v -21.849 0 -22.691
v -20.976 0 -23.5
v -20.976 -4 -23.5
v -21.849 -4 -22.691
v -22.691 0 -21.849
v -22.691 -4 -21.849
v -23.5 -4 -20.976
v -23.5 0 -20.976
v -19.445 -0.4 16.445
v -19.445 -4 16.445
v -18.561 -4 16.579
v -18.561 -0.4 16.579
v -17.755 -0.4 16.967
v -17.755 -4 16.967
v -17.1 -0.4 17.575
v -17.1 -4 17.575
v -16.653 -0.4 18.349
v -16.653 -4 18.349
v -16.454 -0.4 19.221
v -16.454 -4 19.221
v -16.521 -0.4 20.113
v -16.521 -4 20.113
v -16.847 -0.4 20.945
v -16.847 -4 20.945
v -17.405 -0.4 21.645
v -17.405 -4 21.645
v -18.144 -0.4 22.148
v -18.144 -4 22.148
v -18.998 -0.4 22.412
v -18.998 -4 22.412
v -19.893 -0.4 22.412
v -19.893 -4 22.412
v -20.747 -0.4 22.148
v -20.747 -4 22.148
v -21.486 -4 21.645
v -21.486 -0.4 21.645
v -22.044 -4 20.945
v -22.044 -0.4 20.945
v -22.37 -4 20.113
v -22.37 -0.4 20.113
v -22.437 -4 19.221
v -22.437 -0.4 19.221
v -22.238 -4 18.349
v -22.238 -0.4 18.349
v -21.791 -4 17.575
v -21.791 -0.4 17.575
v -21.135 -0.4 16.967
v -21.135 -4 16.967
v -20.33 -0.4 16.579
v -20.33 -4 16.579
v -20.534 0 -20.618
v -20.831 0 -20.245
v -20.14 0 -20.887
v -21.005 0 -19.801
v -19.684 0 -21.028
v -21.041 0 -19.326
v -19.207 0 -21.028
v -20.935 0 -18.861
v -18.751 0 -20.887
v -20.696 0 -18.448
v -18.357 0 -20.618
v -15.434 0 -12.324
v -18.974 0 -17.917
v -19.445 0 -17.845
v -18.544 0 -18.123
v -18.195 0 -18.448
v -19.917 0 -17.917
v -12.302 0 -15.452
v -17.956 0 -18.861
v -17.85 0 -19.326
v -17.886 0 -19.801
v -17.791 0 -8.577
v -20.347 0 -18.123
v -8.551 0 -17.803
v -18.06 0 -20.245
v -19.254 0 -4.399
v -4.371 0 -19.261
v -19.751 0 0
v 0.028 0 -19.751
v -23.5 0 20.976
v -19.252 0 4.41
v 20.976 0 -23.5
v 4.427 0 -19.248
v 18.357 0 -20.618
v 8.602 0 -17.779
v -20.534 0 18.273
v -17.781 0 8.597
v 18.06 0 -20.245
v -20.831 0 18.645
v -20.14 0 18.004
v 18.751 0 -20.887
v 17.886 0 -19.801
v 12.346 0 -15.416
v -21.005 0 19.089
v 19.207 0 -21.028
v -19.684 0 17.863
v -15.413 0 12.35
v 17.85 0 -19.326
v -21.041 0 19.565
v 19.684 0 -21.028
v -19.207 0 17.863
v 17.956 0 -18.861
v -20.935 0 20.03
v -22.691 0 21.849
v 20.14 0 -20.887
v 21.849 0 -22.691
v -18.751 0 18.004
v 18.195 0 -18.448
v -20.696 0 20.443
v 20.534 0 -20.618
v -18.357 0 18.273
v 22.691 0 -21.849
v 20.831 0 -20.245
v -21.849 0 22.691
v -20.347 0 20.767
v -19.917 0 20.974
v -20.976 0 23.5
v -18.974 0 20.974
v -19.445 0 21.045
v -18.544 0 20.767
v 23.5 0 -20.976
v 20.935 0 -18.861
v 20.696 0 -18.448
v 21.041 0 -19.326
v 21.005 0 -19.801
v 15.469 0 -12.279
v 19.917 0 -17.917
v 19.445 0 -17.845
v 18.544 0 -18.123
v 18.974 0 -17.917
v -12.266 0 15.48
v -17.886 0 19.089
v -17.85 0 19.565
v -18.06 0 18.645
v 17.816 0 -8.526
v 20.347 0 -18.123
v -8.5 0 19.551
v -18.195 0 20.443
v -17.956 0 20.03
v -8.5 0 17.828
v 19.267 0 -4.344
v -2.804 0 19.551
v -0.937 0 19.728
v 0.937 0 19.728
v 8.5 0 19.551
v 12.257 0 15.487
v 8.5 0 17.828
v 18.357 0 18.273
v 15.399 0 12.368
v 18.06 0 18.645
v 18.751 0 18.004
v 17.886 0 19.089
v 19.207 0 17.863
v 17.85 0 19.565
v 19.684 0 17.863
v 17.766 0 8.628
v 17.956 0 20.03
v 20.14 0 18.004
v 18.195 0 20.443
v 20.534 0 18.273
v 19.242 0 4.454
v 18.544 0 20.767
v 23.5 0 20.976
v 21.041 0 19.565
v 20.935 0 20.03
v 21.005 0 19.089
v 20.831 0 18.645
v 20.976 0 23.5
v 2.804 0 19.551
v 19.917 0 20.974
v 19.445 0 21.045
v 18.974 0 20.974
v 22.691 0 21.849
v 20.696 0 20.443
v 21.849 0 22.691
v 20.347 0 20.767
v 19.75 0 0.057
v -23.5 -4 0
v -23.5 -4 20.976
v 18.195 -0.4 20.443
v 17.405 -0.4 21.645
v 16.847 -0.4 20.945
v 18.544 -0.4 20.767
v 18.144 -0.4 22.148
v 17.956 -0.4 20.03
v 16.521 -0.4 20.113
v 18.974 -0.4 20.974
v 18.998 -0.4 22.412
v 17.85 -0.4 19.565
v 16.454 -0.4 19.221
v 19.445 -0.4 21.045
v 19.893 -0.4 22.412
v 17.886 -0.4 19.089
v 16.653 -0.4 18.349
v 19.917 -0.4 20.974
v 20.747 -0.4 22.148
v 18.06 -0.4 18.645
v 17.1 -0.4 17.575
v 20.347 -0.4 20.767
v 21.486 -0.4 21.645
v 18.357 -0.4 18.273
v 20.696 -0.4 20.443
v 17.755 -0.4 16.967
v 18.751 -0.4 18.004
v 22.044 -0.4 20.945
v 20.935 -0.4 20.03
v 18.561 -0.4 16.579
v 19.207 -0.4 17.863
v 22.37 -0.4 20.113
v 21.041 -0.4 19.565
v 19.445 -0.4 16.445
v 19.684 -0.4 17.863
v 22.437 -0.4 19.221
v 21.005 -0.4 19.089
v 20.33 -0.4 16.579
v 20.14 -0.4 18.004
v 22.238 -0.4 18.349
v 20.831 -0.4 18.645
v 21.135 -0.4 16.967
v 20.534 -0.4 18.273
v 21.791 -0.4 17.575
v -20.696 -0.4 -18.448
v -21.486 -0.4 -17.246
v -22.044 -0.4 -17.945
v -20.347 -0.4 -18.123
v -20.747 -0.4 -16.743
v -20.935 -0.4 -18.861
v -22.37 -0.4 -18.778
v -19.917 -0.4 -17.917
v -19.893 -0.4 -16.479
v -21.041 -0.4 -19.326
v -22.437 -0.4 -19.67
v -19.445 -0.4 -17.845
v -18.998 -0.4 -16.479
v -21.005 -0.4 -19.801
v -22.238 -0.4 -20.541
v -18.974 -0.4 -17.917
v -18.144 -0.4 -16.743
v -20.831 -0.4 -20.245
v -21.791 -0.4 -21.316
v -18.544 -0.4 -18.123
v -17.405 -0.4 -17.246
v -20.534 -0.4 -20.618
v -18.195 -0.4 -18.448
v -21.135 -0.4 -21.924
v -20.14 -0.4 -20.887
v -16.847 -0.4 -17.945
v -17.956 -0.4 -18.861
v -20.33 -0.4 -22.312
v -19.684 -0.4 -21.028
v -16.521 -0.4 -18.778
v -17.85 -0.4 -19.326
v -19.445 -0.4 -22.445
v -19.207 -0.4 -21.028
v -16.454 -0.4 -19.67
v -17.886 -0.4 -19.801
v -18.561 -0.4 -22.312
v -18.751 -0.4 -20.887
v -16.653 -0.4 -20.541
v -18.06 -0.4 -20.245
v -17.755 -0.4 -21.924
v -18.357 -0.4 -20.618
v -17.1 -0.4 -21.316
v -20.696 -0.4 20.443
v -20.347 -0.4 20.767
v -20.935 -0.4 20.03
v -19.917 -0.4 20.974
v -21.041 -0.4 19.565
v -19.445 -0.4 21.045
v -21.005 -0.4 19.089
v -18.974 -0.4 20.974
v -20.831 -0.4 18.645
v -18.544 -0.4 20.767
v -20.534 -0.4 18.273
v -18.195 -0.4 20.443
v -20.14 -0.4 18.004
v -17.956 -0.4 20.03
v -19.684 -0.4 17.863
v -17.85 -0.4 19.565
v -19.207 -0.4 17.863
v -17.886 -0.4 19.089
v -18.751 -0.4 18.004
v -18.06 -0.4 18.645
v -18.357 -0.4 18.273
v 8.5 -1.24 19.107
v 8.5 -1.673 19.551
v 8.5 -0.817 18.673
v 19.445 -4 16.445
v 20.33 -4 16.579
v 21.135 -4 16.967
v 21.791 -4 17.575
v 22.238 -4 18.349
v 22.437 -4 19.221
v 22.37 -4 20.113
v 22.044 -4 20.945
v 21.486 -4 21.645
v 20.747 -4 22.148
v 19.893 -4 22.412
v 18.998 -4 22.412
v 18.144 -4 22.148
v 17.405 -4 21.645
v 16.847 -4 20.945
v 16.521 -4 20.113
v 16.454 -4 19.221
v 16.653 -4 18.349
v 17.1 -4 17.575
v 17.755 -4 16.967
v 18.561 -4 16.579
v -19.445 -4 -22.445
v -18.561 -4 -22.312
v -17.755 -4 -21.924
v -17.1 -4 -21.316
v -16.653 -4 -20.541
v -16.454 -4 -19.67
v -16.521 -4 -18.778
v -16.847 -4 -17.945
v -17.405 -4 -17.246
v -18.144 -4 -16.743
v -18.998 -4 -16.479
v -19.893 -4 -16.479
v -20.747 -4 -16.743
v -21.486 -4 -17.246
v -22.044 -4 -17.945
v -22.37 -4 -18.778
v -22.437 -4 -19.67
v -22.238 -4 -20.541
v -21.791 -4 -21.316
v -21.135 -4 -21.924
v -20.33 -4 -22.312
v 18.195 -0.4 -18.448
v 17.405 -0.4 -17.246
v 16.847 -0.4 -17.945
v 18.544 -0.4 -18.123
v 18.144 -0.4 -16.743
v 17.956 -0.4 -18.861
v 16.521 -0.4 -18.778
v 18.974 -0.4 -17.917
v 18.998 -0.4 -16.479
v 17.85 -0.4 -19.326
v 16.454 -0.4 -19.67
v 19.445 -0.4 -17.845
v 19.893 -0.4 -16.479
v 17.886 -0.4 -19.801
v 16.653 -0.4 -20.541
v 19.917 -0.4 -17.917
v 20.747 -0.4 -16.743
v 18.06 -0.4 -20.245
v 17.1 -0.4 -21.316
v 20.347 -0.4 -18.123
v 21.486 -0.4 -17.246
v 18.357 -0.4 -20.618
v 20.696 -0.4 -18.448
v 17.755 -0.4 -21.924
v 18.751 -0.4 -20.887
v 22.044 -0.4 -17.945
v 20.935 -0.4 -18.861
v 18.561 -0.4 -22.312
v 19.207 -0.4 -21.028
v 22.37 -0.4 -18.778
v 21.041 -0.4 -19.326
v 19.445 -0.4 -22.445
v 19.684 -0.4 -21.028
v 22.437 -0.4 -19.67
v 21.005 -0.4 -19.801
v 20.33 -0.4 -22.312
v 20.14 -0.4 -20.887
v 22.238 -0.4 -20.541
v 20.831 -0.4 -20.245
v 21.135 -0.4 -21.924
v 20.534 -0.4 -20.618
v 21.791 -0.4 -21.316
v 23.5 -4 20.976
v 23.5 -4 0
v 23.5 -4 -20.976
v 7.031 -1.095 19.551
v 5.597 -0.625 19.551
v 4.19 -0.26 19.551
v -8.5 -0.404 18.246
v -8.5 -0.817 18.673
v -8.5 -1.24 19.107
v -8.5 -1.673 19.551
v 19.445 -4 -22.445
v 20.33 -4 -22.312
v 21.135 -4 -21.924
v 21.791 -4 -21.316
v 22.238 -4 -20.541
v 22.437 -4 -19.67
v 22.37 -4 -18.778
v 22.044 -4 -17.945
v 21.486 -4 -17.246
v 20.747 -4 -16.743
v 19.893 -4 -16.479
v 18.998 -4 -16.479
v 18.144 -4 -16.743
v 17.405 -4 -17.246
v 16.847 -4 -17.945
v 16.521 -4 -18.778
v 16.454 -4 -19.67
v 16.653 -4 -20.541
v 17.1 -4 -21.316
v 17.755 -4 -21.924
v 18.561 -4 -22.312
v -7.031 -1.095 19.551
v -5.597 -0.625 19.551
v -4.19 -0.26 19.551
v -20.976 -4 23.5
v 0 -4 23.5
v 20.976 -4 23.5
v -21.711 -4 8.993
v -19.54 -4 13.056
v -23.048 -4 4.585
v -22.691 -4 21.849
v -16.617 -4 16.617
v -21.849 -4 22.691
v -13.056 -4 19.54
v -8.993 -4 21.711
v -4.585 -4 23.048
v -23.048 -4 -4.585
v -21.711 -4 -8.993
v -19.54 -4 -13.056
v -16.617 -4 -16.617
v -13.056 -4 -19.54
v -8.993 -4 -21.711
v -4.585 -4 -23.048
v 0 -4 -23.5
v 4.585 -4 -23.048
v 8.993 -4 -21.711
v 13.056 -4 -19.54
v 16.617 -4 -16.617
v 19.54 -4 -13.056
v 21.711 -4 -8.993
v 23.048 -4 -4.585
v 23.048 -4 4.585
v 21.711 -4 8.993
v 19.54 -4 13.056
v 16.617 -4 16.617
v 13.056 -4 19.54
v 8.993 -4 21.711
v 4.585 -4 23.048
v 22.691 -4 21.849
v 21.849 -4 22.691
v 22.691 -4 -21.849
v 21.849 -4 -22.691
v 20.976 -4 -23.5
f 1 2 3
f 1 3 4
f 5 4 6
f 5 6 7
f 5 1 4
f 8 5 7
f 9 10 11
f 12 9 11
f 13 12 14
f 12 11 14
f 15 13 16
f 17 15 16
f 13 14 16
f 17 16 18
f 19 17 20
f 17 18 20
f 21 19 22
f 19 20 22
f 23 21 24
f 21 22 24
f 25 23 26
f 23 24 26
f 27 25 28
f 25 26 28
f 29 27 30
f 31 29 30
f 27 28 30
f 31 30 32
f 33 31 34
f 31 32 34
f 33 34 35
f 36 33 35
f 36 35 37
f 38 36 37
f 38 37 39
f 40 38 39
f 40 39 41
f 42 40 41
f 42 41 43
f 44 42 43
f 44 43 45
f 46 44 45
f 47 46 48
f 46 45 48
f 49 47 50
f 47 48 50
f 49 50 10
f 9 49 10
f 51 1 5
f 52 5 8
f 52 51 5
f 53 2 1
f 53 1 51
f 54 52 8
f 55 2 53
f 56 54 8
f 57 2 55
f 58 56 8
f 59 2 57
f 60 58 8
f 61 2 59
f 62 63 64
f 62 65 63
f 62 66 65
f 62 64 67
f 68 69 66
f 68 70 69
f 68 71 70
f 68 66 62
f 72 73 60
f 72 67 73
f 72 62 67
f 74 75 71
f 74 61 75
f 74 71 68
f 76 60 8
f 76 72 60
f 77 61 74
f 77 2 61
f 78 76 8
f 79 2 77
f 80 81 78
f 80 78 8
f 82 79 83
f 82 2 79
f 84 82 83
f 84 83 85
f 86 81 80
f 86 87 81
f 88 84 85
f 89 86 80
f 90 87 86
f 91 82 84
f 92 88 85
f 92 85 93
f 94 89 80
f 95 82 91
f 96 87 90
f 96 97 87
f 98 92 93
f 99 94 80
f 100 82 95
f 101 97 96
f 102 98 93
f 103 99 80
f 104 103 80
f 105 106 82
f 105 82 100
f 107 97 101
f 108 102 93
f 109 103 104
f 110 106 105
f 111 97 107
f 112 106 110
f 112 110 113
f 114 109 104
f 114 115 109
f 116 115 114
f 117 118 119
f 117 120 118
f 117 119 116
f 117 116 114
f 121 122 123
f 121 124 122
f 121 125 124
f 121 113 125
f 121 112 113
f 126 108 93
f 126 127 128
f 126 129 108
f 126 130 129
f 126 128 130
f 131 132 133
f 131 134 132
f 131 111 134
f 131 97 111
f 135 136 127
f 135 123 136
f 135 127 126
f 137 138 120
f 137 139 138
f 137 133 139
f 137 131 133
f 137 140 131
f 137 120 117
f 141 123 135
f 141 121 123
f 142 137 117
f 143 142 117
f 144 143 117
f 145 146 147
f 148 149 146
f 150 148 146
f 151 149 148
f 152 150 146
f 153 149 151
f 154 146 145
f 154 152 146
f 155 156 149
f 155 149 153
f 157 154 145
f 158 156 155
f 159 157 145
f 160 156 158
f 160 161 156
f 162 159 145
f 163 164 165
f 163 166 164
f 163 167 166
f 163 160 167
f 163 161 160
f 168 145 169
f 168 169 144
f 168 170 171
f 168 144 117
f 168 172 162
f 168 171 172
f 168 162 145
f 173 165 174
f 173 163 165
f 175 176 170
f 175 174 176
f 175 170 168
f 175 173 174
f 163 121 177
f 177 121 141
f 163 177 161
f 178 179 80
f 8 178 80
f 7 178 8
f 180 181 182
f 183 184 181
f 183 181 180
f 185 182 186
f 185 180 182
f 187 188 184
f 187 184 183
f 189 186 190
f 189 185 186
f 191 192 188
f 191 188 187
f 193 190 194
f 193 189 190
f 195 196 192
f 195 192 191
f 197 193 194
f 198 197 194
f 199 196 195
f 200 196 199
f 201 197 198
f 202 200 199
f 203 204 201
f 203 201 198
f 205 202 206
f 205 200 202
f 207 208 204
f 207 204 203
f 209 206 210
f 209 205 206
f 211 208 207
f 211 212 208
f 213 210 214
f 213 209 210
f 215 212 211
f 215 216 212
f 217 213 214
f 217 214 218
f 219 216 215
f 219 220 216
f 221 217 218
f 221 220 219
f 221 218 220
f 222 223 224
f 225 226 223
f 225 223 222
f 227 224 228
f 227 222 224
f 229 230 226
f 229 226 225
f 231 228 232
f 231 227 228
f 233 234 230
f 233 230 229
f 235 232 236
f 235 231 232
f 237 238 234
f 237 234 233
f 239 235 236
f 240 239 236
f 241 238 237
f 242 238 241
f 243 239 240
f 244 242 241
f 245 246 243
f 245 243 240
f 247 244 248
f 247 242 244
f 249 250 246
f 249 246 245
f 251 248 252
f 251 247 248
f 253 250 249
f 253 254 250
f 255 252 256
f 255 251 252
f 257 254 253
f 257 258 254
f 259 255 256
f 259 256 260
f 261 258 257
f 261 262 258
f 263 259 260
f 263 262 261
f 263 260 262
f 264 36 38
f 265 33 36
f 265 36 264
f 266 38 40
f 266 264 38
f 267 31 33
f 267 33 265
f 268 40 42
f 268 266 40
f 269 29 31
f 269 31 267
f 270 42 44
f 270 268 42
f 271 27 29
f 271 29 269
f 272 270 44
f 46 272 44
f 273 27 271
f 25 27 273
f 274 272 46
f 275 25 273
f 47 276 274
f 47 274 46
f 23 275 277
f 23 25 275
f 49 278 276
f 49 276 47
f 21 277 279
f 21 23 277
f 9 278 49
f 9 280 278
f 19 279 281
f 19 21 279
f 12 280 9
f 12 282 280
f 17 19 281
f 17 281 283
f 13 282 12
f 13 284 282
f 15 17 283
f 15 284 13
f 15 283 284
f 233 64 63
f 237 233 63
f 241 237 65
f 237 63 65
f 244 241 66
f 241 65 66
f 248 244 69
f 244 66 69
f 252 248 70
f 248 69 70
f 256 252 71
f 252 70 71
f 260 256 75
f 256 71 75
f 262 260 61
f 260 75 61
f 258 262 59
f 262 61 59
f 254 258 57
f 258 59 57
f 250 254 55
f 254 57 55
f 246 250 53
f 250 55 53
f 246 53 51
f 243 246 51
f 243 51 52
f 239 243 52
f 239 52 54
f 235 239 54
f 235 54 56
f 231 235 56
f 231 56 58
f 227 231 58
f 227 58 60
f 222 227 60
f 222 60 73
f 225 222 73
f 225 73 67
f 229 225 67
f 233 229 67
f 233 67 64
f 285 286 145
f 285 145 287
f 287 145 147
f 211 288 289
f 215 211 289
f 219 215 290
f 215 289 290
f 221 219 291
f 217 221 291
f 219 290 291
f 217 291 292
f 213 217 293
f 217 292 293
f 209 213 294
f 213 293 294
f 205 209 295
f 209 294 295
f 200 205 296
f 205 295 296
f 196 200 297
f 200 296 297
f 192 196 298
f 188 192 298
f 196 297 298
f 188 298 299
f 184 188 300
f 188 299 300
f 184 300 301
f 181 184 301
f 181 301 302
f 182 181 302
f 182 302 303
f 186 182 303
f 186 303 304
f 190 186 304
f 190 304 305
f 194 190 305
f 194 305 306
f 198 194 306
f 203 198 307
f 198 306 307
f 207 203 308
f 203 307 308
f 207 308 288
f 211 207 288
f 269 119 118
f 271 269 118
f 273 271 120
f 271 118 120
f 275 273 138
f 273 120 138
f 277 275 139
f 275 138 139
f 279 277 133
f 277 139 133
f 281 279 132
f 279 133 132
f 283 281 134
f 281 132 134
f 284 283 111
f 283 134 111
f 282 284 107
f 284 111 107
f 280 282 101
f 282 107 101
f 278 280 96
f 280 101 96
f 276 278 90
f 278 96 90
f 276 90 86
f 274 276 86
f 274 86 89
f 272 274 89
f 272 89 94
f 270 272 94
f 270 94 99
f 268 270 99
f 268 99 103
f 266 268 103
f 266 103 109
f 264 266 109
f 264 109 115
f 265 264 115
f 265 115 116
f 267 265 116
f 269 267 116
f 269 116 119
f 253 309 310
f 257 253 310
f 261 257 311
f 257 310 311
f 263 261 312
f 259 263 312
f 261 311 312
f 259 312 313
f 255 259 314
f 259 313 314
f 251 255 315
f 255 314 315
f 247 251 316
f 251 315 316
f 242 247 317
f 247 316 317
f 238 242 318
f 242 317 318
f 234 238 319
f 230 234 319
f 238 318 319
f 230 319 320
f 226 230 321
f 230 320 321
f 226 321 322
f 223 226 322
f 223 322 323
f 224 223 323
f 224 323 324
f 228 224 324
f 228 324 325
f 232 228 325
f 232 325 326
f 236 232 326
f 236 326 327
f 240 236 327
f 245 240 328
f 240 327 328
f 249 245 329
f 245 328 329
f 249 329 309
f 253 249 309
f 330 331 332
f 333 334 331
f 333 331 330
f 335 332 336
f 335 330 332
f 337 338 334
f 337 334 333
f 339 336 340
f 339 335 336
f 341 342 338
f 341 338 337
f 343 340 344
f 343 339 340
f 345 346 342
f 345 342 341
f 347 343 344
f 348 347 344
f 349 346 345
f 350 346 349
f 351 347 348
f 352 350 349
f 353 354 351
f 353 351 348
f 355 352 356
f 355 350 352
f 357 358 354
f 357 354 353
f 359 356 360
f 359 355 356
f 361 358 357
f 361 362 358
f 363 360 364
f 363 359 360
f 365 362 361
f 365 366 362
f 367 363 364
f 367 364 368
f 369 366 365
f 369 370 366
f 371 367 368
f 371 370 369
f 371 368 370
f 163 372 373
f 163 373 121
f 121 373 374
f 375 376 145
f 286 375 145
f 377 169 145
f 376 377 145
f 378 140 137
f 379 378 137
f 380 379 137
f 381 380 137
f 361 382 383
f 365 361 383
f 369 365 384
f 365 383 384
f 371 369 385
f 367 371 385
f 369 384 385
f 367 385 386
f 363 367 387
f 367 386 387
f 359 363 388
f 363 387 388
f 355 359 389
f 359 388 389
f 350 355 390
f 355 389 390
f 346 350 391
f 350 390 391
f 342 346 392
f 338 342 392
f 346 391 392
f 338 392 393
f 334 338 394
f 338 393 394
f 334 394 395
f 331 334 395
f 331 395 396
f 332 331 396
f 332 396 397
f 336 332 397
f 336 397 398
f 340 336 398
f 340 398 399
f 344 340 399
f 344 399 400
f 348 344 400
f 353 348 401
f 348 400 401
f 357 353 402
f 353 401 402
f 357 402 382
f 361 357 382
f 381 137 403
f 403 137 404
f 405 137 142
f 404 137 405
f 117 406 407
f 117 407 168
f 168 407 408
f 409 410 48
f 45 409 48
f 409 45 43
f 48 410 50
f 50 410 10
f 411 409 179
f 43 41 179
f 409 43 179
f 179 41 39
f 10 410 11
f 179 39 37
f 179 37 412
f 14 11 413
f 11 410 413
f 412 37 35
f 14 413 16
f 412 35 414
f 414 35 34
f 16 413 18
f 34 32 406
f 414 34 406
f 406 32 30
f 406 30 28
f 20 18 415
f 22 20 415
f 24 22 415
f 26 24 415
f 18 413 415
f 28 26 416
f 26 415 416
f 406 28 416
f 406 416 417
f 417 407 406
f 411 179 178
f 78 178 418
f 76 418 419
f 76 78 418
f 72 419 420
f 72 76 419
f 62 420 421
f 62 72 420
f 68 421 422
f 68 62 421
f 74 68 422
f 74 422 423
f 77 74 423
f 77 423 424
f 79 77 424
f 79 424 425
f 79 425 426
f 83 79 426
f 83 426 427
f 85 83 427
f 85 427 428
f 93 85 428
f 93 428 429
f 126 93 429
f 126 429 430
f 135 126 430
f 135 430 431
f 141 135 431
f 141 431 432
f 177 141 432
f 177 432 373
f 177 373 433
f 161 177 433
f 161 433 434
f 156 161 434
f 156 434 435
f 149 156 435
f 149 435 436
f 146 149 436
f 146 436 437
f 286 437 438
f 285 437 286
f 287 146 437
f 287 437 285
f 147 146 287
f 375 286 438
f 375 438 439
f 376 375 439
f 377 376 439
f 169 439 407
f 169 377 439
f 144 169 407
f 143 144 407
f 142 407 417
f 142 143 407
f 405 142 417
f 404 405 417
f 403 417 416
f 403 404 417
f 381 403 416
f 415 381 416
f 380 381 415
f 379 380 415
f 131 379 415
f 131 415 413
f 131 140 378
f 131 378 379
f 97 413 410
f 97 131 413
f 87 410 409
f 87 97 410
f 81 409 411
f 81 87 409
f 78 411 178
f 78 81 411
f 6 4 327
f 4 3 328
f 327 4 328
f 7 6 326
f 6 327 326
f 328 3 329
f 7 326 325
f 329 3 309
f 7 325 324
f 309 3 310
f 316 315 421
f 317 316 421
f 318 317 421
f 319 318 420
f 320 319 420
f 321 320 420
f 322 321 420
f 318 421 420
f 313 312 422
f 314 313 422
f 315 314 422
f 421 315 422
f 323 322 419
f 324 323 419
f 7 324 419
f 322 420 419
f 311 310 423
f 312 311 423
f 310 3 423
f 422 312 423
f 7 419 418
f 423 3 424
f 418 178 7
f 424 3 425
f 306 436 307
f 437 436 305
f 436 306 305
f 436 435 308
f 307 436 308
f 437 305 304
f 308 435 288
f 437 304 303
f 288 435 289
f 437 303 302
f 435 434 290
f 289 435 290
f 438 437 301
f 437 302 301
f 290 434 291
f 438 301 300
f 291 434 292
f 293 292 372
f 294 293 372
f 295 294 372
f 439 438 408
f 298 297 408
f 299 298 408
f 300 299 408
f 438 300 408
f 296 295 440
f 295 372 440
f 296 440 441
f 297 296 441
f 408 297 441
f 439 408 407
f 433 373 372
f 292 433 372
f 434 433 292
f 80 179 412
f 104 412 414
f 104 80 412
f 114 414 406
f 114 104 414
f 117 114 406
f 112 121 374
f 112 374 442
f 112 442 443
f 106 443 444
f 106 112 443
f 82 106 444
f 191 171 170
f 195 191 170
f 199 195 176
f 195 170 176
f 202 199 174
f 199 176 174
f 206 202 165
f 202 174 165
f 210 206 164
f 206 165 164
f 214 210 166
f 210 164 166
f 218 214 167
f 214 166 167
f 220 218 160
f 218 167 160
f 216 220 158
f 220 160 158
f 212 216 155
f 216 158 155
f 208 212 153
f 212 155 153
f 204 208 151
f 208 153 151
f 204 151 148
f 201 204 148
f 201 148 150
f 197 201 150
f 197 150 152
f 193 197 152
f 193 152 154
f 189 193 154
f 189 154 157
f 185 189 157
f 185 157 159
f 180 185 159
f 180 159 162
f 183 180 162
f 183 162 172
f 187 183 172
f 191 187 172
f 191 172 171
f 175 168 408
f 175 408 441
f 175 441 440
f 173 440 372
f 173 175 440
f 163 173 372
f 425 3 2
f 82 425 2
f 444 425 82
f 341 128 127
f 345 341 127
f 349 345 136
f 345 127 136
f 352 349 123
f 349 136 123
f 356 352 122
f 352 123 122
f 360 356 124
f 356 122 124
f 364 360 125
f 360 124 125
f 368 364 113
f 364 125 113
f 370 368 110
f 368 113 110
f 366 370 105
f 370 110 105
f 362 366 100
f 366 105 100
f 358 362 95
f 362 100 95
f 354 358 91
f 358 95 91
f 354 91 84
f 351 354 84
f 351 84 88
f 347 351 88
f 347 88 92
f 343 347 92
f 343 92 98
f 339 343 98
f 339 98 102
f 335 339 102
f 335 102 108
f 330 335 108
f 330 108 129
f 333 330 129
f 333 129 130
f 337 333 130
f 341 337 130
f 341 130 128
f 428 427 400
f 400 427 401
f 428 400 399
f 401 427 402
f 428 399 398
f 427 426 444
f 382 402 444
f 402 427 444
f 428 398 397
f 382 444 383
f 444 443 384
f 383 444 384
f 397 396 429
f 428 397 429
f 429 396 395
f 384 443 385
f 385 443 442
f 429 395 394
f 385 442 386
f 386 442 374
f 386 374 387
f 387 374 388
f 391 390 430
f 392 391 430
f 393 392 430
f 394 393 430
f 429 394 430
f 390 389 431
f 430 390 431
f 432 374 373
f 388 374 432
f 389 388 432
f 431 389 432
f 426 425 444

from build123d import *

# Parameters (mm, degrees)
SKETCH1_R         = 31.5
SKETCH1_R_2       = 1.6
BASE_DEPTH        = 4
SKETCH3_R         = 23.5
SKETCH4_R         = 19.75054858
CONNECTORS_DEPTH  = 45.72694938
SKETCH5_R         = 3
SCREW_HEADS_DEPTH = 3.6
FLEX_CABLE_DEPTH  = 34.473870559


with BuildPart() as part:
    # Sketch1 → Base (new body)
    with BuildSketch(Plane(origin=(0, 0, 0), x_dir=(1, 0, 0), z_dir=(0, 1, 0))):
        with Locations(Location((0, 0, 0), (0, 0, 270))):
            Circle(SKETCH1_R)
        with Locations(Location((-19.445436483, -19.445436483, 0), (0, 0, 270))):
            Circle(SKETCH1_R_2, mode=Mode.SUBTRACT)
        with Locations(Location((-19.445436483, 19.445436483, 0), (0, 0, 270))):
            Circle(SKETCH1_R_2, mode=Mode.SUBTRACT)
        with Locations(Location((19.445436483, -19.445436483, 0), (0, 0, 270))):
            Circle(SKETCH1_R_2, mode=Mode.SUBTRACT)
        with Locations(Location((19.445436483, 19.445436483, 0), (0, 0, 270))):
            Circle(SKETCH1_R_2, mode=Mode.SUBTRACT)
    extrude(amount=-BASE_DEPTH)

    # Sketch3 → Skirt section 0
    with BuildSketch(Plane(origin=(0, -4, 0), x_dir=(-1, 0, 0), z_dir=(0, -1, 0))):
        Circle(SKETCH3_R)
    # Sketch4 → Skirt section 1
    with BuildSketch(Plane(origin=(0, 0, 0), x_dir=(1, 0, 0), z_dir=(0, 1, 0))):
        Circle(SKETCH4_R)
    loft(mode=Mode.SUBTRACT)

    # Sketch6 → Connectors (cut, through all)
    with BuildSketch(Plane(origin=(0, -4, 0), x_dir=(-1, 0, 0), z_dir=(0, -1, 0))):
        with BuildLine():
            Line((20.976176963, 23.5), (-20.976176963, 23.5))
            ThreePointArc((-20.976176963, 23.5), (0, 31.5), (20.976176963, 23.5))
        make_face()
        with BuildLine():
            Line((20.976176963, -23.5), (-20.976176963, -23.5))
            ThreePointArc((-20.976176963, -23.5), (0, -31.5), (20.976176963, -23.5))
        make_face()
        with BuildLine():
            Line((23.5, -20.976176963), (23.5, 20.976176963))
            ThreePointArc((23.5, 20.976176963), (31.5, 0), (23.5, -20.976176963))
        make_face()
        with BuildLine():
            Line((-23.5, -20.976176963), (-23.5, 20.976176963))
            ThreePointArc((-23.5, 20.976176963), (-31.5, 0), (-23.5, -20.976176963))
        make_face()
    extrude(amount=-CONNECTORS_DEPTH, mode=Mode.SUBTRACT)

    # Sketch5 → Screw heads (cut)
    with BuildSketch(Plane(origin=(0, -4, 0), x_dir=(-1, 0, 0), z_dir=(0, -1, 0))):
        with Locations(Location((19.445436483, -19.445436483, 0), (0, 0, 90))):
            Circle(SKETCH5_R)
        with Locations(Location((19.445436483, 19.445436483, 0), (0, 0, 90))):
            Circle(SKETCH5_R)
        with Locations(Location((-19.445436483, -19.445436483, 0), (0, 0, 90))):
            Circle(SKETCH5_R)
        with Locations(Location((-19.445436483, 19.445436483, 0), (0, 0, 90))):
            Circle(SKETCH5_R)
    extrude(amount=-SCREW_HEADS_DEPTH, mode=Mode.SUBTRACT)

    # Sketch7 → Flex cable (cut, through all)
    with BuildSketch(Plane(origin=(0, 0, 0), x_dir=(1, 0, 0), z_dir=(0, 1, 0))):
        Polygon((-8.5, -19.55054858), (8.5, -19.55054858), (8.5, -18.75054858), (8.5, 0), (0, 0), (-8.5, 0), (-8.5, -18.75054858), align=None)
    extrude(amount=-FLEX_CABLE_DEPTH, mode=Mode.SUBTRACT)


solid = part.part
